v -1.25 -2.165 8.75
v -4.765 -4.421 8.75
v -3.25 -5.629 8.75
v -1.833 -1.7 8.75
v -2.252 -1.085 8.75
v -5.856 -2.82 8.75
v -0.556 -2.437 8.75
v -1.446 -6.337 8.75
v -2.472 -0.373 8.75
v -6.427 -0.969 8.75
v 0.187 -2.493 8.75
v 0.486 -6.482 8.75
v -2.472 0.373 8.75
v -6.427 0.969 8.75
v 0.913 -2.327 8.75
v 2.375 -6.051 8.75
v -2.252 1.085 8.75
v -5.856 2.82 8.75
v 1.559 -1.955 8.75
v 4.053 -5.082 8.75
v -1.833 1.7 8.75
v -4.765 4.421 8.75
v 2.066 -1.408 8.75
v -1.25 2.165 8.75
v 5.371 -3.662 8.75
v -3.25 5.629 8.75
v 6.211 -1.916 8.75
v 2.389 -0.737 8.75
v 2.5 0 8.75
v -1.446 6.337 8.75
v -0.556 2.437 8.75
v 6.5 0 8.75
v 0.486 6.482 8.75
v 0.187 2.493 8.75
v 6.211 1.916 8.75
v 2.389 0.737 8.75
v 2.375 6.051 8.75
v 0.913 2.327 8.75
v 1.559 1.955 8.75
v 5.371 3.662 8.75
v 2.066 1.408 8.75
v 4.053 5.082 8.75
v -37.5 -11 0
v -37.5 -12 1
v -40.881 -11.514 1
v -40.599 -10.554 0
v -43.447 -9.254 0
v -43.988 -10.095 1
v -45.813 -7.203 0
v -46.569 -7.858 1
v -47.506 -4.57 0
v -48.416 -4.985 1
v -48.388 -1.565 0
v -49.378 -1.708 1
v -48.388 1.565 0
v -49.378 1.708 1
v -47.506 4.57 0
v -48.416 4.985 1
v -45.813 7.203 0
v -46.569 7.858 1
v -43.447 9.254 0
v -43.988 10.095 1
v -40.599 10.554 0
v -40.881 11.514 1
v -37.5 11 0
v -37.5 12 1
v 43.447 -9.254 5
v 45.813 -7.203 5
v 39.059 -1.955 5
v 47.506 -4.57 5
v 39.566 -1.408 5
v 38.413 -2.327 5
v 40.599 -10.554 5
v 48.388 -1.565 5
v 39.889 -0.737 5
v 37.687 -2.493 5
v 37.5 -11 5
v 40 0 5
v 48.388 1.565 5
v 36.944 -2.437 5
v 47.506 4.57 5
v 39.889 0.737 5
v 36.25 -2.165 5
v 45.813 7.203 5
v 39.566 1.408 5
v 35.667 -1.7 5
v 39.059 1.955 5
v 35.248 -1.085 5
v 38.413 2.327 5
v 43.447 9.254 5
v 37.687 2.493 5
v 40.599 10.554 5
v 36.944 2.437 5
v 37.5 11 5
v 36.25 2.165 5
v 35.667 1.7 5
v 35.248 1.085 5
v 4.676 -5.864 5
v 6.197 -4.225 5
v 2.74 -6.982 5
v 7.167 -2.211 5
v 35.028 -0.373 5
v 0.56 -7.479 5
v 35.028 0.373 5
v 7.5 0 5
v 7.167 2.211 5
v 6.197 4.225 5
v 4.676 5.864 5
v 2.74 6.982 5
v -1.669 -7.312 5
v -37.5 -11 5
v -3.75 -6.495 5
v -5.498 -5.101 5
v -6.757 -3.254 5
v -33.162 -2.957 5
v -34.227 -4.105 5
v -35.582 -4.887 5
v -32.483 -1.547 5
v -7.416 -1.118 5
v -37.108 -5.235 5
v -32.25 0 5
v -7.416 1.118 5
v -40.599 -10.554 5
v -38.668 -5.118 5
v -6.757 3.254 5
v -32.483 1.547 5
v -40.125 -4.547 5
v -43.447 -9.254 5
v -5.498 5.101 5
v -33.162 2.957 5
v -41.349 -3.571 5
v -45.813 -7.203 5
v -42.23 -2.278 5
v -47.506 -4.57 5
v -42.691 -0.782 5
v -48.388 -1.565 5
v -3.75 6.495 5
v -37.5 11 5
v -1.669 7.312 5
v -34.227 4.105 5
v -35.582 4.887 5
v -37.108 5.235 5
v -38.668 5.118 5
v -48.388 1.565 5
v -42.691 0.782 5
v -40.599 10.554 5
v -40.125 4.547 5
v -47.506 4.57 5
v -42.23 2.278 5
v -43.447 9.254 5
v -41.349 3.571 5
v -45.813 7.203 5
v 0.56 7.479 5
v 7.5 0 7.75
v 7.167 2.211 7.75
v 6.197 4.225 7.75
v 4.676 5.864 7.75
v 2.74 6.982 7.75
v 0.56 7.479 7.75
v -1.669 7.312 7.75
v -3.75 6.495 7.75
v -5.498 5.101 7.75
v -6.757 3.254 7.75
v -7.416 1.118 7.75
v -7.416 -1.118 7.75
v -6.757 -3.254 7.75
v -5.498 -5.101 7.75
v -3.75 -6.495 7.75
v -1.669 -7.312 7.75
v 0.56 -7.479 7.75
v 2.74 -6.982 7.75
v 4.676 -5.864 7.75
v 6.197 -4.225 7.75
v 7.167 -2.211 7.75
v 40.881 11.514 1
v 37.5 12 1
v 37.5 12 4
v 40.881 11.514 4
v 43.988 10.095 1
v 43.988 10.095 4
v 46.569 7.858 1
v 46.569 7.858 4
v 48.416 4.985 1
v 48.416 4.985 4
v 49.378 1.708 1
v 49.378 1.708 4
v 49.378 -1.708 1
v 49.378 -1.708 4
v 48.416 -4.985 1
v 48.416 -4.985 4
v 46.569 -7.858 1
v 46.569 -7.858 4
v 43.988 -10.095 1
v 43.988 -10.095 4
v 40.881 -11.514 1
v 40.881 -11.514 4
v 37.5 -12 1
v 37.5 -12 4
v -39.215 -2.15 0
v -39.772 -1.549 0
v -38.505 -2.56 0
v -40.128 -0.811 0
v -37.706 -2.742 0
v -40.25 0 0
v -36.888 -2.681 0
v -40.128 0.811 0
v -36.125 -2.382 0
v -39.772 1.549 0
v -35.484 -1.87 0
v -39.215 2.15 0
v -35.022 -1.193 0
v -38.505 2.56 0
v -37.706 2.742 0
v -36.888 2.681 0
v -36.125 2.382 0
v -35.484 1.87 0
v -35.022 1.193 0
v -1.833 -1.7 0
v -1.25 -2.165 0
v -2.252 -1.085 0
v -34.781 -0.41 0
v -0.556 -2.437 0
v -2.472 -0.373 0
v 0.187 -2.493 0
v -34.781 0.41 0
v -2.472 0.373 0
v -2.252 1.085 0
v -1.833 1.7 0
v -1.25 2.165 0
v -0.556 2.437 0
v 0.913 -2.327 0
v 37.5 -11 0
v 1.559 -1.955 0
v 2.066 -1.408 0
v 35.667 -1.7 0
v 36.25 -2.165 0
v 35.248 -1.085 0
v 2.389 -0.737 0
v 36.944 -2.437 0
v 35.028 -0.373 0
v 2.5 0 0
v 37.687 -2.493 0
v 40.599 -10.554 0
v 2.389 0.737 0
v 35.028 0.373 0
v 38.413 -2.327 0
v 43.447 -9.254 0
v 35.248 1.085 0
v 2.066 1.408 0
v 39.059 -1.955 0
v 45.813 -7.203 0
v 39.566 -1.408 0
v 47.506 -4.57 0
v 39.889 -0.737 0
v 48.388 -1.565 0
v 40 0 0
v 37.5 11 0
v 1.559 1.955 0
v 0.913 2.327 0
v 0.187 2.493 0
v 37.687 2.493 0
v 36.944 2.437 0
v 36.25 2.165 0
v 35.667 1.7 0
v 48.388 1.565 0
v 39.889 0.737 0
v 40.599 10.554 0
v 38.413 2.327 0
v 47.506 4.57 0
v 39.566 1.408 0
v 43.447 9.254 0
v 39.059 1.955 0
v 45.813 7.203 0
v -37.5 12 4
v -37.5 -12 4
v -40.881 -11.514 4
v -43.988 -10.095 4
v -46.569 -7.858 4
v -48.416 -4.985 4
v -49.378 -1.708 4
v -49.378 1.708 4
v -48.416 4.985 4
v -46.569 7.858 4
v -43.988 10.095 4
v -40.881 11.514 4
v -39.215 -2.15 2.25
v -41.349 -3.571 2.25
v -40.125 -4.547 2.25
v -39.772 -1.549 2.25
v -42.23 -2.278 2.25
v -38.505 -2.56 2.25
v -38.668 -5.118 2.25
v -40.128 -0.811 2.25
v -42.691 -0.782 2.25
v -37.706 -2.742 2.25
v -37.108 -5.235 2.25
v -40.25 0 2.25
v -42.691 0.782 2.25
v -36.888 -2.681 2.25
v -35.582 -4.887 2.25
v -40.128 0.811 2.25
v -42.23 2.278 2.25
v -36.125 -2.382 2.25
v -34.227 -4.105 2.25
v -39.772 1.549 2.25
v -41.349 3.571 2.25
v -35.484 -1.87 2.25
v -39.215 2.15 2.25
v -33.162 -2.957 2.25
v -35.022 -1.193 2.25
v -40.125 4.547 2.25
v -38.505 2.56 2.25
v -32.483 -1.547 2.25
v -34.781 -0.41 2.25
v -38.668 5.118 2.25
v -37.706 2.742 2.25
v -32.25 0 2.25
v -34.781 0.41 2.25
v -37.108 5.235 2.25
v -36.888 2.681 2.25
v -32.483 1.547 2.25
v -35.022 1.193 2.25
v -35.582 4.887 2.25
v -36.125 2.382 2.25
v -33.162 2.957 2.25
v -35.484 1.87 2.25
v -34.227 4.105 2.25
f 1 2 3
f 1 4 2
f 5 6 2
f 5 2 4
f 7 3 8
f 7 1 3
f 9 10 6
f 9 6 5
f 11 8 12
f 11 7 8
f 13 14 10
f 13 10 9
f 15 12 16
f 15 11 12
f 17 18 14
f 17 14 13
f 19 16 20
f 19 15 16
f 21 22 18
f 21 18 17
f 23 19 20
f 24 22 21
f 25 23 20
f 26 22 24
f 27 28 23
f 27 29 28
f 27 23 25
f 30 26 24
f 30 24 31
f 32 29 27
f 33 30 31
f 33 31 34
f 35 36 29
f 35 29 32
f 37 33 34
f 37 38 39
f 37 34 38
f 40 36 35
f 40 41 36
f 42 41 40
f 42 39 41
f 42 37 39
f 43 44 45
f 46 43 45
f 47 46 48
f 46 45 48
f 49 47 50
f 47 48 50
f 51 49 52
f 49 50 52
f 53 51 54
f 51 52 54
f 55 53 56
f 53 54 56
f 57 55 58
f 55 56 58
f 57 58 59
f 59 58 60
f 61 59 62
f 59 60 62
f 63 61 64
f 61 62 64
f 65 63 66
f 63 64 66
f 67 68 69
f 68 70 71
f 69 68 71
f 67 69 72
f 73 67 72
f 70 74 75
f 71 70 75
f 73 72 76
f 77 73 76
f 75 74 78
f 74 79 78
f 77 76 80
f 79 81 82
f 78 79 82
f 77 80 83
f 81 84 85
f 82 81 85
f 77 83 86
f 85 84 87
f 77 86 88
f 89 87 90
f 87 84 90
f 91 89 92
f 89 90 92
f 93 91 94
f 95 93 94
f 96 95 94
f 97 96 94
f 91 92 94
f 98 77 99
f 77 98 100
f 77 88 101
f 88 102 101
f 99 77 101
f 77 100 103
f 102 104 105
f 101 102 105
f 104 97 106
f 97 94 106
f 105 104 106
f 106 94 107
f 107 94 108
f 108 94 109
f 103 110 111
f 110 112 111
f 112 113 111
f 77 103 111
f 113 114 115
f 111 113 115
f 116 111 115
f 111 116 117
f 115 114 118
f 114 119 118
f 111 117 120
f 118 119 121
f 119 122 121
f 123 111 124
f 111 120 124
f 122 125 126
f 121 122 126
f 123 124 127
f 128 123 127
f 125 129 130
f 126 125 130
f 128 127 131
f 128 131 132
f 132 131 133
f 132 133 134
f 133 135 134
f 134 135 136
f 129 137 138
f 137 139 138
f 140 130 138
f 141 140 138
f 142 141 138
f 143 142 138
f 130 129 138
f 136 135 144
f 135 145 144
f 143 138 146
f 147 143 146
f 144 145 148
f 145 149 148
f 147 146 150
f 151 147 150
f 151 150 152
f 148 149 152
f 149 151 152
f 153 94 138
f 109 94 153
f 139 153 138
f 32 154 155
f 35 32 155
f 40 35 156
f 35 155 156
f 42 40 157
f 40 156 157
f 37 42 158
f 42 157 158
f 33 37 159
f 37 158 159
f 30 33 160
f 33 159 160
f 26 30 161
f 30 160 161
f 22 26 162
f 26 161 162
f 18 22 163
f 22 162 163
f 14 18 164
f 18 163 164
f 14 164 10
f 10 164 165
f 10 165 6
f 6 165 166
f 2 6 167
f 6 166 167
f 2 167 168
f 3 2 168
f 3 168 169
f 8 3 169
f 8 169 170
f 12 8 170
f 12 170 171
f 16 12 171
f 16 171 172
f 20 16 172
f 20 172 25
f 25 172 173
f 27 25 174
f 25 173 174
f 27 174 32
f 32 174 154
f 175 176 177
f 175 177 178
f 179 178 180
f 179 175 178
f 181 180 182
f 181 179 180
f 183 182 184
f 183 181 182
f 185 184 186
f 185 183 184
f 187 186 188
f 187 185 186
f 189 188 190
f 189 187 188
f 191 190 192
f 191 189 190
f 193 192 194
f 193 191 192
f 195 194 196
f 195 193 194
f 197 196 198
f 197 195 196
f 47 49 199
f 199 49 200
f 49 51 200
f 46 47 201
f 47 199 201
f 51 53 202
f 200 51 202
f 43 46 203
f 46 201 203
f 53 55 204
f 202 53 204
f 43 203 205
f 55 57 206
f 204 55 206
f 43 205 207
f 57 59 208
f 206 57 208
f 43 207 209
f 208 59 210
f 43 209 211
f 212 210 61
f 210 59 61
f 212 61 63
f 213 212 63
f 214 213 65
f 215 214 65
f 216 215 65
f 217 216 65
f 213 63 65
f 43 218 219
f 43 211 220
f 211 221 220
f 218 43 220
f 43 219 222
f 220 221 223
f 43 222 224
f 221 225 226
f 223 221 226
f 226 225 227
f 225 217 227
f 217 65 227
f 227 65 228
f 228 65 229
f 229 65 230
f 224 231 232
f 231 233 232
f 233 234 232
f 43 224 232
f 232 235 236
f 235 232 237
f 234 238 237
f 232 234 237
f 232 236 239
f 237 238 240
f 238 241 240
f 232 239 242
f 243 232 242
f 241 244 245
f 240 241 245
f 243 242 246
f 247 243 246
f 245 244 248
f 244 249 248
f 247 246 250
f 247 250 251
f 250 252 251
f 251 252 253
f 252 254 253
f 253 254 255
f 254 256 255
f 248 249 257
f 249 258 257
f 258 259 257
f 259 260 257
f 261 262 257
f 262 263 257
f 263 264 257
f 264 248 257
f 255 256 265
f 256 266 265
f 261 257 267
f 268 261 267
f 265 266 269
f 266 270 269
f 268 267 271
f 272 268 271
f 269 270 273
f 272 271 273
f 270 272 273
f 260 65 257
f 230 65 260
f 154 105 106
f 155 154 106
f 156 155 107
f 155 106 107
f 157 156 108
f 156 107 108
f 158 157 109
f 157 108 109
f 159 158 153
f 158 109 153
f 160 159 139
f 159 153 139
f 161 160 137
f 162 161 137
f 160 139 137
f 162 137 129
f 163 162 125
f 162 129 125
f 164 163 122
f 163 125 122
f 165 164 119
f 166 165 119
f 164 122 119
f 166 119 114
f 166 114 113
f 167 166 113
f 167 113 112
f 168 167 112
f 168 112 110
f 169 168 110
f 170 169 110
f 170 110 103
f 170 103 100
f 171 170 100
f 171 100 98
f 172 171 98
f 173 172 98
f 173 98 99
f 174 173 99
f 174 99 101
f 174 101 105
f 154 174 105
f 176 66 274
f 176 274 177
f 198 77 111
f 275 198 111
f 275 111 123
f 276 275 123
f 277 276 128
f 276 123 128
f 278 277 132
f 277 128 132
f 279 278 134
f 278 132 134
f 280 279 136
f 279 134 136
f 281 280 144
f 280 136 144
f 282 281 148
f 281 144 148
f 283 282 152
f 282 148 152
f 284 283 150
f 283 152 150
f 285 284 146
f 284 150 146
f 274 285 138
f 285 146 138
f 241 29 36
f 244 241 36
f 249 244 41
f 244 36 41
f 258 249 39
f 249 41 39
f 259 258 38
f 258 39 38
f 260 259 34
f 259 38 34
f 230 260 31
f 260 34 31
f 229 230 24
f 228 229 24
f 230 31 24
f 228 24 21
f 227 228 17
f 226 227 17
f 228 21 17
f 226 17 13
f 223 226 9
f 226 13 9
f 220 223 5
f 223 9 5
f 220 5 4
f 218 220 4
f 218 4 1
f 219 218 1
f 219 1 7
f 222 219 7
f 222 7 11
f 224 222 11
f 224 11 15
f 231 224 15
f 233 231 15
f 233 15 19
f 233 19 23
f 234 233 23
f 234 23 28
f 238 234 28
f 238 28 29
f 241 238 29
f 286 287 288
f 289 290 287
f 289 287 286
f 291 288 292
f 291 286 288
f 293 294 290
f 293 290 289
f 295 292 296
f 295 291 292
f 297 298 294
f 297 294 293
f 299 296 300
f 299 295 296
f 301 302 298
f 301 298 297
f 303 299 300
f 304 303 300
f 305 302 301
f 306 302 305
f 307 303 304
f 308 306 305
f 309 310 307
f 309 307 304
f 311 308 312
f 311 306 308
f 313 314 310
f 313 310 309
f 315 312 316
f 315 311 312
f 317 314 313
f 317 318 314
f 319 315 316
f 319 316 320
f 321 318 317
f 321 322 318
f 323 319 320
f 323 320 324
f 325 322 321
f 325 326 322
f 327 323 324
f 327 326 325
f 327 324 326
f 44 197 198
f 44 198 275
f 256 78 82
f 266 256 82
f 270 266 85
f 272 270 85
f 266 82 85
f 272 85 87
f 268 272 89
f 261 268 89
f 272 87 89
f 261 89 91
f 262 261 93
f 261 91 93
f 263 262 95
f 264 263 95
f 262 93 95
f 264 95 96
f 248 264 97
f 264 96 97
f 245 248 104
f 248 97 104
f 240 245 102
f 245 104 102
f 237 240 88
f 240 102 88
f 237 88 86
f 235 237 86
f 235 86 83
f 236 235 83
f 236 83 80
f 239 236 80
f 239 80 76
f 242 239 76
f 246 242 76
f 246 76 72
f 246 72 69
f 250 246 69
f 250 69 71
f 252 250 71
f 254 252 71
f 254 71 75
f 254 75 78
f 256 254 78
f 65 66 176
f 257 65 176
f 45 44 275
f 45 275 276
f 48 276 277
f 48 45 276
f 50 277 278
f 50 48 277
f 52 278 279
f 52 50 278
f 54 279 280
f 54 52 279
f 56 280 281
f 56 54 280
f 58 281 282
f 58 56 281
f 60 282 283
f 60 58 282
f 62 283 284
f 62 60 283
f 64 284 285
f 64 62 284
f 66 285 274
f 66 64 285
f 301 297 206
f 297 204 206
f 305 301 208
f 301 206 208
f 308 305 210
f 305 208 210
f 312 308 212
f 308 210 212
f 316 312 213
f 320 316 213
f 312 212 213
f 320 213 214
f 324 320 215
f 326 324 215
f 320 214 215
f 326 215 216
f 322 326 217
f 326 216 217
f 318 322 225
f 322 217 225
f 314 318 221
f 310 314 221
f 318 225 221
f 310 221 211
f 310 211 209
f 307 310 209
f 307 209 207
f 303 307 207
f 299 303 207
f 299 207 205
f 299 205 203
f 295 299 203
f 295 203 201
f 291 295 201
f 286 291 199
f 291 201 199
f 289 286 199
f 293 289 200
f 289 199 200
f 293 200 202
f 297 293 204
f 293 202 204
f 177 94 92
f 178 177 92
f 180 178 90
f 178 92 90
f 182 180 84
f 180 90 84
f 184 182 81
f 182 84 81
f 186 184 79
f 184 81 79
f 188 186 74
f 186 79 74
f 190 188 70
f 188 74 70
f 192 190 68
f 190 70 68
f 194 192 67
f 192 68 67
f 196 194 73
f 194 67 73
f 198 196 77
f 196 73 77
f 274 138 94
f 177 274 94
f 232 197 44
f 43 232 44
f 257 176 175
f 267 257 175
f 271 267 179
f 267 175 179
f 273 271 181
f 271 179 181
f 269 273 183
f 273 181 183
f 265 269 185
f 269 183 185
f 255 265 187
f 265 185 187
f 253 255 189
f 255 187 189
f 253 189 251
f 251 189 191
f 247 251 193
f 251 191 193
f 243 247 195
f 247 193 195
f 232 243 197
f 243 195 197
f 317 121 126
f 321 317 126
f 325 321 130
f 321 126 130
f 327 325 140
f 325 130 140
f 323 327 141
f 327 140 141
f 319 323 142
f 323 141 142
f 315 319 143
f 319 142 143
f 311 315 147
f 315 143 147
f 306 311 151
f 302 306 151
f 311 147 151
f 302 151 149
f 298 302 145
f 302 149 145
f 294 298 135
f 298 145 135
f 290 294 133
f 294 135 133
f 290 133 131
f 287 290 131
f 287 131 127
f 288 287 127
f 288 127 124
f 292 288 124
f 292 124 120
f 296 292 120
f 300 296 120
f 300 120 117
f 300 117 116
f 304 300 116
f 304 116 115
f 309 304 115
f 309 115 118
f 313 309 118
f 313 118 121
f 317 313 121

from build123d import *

# Parameters (mm, degrees)
BOSS_EXTRUDE1_DEPTH             = 5
SKETCH4_R                       = 7.5
BOSS_EXTRUDE3_DEPTH             = 8.75
SKETCH5_R                       = 2.5
CUT_EXTRUDE2_DEPTH              = 10
CBORE_FOR_M5_SBHCS1_D           = 5.5
CBORE_FOR_M5_SBHCS1_CBORE_D     = 10.5
CBORE_FOR_M5_SBHCS1_CBORE_DEPTH = 2.75
SKETCH8_R                       = 2.5
CUT_EXTRUDE3_DEPTH              = 10
CHAMFER1_SIZE                   = 1


with BuildPart() as part:
    # Sketch2 → Boss-Extrude1 (new body)
    with BuildSketch(Plane.XY):
        with BuildLine():
            Line((-37.5, 12), (37.5, 12))
            ThreePointArc((37.5, 12), (49.5, 0), (37.5, -12))
            Line((37.5, -12), (-37.5, -12))
            ThreePointArc((-37.5, -12), (-49.5, 0), (-37.5, 12))
        make_face()
    extrude(amount=BOSS_EXTRUDE1_DEPTH)

    # Sketch4 → Boss-Extrude3 (add)
    with BuildSketch(Plane.XY):
        Circle(SKETCH4_R)
    extrude(amount=BOSS_EXTRUDE3_DEPTH)

    # Sketch5 → Cut-Extrude2 (cut)
    with BuildSketch(Plane.XY.offset(8.75)):
        Circle(SKETCH5_R)
    extrude(amount=-CUT_EXTRUDE2_DEPTH, mode=Mode.SUBTRACT)

    # CBORE for M5 SBHCS1 (through all)
    with Locations(Plane.XY.offset(5)):
        with Locations((-37.5, 0)):
            CounterBoreHole(CBORE_FOR_M5_SBHCS1_D / 2, CBORE_FOR_M5_SBHCS1_CBORE_D / 2, CBORE_FOR_M5_SBHCS1_CBORE_DEPTH)

    # Sketch8 → Cut-Extrude3 (cut)
    with BuildSketch(Plane.XY.offset(5)):
        with Locations((37.5, 0)):
            Circle(SKETCH8_R)
    extrude(amount=-CUT_EXTRUDE3_DEPTH, mode=Mode.SUBTRACT)

    # Chamfer1
    chamfer1_edges = [part.edges().sort_by_distance(p)[0] for p in [
        (49.5, 0, 5),
        (-7.5, 0, 8.75),
        (0, 12, 5),
        (-49.5, 0, 5),
        (0, 12, 0),
        (49.5, 0, 0),
        (0, -12, 0),
        (-49.5, 0, 0),
        (0, -12, 5),
    ]]
    chamfer(chamfer1_edges, length=CHAMFER1_SIZE)


solid = part.part
